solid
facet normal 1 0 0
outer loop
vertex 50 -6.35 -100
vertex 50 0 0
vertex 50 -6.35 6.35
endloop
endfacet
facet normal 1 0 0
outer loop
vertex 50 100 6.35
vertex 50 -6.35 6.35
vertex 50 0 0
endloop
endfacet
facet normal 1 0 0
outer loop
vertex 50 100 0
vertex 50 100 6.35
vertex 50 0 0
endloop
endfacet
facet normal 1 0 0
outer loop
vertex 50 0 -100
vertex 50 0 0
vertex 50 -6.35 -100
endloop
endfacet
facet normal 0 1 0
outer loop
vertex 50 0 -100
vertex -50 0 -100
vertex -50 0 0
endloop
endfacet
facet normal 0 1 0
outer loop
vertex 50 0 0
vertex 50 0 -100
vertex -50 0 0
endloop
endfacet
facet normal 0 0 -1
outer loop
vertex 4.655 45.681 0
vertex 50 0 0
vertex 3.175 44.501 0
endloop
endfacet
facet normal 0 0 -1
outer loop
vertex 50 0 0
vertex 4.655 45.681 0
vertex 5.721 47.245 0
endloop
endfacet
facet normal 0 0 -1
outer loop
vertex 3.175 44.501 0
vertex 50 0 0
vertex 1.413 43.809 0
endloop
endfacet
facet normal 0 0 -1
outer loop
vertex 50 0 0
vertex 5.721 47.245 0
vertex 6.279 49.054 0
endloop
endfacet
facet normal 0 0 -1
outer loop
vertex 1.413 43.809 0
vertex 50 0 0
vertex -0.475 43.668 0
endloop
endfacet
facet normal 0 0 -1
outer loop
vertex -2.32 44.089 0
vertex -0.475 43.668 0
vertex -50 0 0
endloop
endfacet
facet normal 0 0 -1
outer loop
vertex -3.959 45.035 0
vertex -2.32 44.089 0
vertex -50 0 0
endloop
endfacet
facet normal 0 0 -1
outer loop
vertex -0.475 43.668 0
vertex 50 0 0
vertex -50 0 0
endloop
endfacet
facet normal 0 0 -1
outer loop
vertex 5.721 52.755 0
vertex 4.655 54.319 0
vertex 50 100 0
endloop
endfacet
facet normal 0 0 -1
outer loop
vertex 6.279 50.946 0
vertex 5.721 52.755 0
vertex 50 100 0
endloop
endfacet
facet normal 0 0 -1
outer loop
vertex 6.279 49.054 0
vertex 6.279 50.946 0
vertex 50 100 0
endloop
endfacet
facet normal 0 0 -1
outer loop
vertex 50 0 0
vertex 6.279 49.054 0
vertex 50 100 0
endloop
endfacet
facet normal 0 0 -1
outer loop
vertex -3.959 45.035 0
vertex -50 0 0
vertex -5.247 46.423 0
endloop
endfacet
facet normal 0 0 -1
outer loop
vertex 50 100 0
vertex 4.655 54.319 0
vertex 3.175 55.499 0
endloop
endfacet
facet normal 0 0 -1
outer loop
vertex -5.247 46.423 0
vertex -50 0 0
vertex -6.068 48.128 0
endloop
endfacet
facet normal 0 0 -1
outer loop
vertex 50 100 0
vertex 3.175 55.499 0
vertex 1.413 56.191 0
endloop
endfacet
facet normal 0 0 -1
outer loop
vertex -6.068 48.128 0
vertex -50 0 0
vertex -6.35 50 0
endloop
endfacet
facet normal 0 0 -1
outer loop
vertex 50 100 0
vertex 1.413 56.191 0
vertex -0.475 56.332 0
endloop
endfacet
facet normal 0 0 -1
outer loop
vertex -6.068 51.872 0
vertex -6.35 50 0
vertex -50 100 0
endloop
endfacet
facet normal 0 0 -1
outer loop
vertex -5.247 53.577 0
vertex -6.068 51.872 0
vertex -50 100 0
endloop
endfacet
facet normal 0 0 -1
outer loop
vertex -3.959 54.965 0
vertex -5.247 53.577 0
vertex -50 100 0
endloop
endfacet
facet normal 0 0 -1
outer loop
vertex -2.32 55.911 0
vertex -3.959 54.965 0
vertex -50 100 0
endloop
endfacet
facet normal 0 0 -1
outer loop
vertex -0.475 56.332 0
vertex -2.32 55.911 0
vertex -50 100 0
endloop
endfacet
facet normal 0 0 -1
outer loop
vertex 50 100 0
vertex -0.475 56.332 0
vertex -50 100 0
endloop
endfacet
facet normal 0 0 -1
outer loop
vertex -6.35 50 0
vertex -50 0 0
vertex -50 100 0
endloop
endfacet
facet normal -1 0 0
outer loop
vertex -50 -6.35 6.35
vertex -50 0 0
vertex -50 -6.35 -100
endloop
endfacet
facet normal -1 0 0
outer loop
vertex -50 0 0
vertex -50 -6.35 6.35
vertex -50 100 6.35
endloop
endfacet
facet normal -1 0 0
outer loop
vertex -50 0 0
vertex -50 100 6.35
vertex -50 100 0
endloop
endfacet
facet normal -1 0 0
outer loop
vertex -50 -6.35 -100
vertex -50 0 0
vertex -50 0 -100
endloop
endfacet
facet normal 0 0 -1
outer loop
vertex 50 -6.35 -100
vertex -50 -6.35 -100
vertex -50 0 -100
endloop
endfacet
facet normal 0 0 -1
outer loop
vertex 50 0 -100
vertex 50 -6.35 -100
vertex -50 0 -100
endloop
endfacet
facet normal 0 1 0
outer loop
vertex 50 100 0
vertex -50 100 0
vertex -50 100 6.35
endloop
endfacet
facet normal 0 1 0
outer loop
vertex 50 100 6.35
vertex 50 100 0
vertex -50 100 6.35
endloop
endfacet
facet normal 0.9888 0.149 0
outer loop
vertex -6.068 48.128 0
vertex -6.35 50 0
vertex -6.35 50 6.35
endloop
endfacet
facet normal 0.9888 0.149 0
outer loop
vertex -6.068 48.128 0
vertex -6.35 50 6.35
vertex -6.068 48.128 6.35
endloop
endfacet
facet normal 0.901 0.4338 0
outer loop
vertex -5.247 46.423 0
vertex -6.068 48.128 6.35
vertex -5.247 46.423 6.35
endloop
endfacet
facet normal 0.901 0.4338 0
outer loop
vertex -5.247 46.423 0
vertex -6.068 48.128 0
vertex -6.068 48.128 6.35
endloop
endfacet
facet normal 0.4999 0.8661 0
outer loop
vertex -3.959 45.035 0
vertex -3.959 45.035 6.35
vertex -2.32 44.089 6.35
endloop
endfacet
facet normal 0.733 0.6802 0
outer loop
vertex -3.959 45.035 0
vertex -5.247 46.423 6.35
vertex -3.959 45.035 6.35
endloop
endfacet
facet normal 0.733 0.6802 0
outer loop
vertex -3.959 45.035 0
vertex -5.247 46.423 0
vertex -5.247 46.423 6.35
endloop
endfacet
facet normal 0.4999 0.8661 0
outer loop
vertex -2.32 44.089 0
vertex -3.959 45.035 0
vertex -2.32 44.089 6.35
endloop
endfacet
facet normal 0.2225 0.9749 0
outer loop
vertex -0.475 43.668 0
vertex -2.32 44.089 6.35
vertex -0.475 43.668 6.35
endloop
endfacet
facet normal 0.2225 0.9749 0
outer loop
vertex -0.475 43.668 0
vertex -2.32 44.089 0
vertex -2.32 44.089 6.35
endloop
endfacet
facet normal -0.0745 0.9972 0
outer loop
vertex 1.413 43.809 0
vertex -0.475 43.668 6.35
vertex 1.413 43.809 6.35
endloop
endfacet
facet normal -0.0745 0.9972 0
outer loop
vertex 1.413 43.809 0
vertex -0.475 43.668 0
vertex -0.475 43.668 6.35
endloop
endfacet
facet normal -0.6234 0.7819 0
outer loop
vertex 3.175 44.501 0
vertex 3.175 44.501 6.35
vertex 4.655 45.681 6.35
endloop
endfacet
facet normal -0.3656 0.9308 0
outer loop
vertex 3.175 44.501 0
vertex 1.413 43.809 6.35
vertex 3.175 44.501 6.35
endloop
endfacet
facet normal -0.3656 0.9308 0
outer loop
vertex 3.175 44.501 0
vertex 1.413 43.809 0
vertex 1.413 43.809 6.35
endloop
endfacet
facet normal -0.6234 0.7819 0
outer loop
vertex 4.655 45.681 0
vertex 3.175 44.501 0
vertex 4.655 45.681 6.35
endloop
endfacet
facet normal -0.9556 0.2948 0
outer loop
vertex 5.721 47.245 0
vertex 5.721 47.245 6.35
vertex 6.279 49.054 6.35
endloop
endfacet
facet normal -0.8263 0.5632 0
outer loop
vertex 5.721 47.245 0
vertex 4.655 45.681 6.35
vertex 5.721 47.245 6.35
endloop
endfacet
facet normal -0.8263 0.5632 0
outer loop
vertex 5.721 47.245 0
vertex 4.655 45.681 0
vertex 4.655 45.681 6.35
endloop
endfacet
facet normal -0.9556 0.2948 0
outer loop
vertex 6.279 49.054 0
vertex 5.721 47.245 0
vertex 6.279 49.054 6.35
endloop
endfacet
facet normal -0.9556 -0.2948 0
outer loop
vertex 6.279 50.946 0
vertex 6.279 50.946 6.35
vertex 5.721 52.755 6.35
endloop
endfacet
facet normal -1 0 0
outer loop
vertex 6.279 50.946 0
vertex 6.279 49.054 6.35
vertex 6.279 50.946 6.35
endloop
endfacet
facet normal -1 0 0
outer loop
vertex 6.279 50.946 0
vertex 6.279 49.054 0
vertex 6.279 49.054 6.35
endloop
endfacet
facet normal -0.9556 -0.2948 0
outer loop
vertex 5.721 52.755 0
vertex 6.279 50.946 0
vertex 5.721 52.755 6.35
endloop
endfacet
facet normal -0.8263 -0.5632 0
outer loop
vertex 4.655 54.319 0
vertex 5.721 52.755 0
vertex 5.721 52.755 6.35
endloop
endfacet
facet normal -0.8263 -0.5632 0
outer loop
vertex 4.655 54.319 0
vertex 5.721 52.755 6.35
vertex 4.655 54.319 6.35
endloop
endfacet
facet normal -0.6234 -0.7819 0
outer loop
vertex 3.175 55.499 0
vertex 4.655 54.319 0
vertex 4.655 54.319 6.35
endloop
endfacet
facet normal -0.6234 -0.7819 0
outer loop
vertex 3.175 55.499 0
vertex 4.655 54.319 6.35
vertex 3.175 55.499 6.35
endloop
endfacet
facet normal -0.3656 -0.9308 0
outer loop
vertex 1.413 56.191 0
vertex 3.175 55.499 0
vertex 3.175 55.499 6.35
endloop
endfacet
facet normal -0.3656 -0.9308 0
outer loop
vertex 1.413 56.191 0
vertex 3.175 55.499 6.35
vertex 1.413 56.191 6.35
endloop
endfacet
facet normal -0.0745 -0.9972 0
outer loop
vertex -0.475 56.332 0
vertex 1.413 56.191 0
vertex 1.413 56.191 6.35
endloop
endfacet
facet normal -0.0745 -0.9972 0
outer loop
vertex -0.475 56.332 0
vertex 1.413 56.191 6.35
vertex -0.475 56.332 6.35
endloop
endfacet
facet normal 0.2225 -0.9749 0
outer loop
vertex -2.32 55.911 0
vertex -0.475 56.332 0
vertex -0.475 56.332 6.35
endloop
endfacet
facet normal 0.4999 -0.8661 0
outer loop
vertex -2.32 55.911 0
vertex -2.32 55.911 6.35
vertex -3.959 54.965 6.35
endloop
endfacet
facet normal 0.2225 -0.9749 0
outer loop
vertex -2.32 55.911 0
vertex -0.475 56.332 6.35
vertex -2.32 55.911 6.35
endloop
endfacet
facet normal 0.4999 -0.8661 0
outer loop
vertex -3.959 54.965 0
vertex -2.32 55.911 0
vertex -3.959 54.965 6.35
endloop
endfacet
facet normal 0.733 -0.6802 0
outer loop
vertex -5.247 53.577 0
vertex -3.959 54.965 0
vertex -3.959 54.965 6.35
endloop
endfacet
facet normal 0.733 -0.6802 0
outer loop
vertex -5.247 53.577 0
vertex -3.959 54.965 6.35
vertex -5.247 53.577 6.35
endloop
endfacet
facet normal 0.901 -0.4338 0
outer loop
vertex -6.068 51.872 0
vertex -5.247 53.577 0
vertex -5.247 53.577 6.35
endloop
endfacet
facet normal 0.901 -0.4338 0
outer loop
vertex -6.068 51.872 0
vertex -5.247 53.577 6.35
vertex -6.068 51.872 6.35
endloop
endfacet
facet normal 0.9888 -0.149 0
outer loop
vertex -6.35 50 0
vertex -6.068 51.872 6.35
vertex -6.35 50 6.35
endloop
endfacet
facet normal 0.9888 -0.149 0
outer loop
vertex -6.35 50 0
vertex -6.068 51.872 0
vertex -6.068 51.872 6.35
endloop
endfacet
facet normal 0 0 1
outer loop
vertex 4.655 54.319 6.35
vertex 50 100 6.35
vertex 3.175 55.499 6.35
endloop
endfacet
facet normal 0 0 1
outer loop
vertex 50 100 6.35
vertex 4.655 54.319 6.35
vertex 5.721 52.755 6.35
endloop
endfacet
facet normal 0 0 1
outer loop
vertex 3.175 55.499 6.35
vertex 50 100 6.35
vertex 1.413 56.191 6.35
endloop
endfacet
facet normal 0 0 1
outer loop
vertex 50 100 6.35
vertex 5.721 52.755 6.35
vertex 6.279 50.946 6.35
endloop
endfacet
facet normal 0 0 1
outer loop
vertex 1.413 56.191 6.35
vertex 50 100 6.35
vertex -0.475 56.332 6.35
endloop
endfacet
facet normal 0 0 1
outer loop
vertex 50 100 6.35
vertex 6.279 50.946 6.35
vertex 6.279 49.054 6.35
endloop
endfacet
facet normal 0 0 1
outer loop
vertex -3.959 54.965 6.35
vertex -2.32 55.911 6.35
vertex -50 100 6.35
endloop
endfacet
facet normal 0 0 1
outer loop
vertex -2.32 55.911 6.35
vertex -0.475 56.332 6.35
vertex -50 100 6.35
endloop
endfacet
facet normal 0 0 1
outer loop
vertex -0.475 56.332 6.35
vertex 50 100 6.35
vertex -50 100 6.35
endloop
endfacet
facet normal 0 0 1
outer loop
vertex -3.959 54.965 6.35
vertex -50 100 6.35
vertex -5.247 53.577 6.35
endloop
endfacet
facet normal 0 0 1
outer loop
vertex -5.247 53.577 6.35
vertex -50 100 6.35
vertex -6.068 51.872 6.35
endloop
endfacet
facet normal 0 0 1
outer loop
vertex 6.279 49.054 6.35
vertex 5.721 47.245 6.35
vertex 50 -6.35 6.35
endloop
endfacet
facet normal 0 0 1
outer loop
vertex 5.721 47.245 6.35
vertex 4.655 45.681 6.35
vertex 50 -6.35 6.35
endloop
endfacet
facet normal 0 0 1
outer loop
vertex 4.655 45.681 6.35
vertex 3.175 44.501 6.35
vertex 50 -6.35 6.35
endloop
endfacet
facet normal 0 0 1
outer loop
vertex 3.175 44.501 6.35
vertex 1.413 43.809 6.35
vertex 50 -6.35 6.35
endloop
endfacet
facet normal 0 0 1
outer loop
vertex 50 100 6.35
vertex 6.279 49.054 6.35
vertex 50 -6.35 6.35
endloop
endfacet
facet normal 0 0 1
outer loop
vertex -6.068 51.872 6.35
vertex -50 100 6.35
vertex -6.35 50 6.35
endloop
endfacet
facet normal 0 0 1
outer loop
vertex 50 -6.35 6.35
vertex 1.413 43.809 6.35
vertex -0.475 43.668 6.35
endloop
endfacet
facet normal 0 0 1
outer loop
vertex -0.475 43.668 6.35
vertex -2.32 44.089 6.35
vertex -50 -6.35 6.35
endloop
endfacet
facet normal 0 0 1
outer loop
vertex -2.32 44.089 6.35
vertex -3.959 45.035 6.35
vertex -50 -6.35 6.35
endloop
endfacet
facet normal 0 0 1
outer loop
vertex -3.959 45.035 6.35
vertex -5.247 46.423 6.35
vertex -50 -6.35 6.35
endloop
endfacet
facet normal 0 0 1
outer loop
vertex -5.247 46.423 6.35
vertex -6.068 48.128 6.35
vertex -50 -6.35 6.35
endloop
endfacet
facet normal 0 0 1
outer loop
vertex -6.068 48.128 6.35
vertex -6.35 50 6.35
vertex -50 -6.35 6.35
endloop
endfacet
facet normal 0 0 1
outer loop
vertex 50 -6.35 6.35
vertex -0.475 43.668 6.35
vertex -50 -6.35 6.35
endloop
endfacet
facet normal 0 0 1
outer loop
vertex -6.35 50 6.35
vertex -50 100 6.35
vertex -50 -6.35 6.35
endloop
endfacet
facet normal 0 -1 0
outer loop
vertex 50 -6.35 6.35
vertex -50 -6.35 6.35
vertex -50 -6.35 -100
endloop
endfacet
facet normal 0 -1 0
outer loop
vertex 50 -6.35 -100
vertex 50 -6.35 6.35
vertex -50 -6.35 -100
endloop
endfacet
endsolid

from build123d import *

# Parameters (mm, degrees)
BOSS_EXTRUDE1_DEPTH      = 50
BOSS_EXTRUDE1_DEPTH_BACK = 50
CUT_EXTRUDE1_DEPTH       = 50
CUT_EXTRUDE1_DEPTH_BACK  = 50
SKETCH2_R                = 6.35


with BuildPart() as part:
    # Sketch1 → Boss-Extrude1 (new, two sides: drawn at the far end of the back side and taken through both)
    with BuildSketch(Plane(origin=(0, 0, 0), x_dir=(0, 0, -1), z_dir=(1, 0, 0)).offset(-BOSS_EXTRUDE1_DEPTH_BACK)):
        Polygon((0, 0), (0, 100), (-6.35, 100), (-6.35, -6.35), (100, -6.35), (100, 0), align=None)
    extrude(amount=BOSS_EXTRUDE1_DEPTH + BOSS_EXTRUDE1_DEPTH_BACK)

    # Sketch2 → Cut-Extrude1 (cut, two sides: drawn at the far end of the back side and taken through both)
    with BuildSketch(Plane.XY.offset(-CUT_EXTRUDE1_DEPTH_BACK)):
        with Locations((0, 50)):
            Circle(SKETCH2_R)
    extrude(amount=CUT_EXTRUDE1_DEPTH + CUT_EXTRUDE1_DEPTH_BACK, mode=Mode.SUBTRACT)


solid = part.part
